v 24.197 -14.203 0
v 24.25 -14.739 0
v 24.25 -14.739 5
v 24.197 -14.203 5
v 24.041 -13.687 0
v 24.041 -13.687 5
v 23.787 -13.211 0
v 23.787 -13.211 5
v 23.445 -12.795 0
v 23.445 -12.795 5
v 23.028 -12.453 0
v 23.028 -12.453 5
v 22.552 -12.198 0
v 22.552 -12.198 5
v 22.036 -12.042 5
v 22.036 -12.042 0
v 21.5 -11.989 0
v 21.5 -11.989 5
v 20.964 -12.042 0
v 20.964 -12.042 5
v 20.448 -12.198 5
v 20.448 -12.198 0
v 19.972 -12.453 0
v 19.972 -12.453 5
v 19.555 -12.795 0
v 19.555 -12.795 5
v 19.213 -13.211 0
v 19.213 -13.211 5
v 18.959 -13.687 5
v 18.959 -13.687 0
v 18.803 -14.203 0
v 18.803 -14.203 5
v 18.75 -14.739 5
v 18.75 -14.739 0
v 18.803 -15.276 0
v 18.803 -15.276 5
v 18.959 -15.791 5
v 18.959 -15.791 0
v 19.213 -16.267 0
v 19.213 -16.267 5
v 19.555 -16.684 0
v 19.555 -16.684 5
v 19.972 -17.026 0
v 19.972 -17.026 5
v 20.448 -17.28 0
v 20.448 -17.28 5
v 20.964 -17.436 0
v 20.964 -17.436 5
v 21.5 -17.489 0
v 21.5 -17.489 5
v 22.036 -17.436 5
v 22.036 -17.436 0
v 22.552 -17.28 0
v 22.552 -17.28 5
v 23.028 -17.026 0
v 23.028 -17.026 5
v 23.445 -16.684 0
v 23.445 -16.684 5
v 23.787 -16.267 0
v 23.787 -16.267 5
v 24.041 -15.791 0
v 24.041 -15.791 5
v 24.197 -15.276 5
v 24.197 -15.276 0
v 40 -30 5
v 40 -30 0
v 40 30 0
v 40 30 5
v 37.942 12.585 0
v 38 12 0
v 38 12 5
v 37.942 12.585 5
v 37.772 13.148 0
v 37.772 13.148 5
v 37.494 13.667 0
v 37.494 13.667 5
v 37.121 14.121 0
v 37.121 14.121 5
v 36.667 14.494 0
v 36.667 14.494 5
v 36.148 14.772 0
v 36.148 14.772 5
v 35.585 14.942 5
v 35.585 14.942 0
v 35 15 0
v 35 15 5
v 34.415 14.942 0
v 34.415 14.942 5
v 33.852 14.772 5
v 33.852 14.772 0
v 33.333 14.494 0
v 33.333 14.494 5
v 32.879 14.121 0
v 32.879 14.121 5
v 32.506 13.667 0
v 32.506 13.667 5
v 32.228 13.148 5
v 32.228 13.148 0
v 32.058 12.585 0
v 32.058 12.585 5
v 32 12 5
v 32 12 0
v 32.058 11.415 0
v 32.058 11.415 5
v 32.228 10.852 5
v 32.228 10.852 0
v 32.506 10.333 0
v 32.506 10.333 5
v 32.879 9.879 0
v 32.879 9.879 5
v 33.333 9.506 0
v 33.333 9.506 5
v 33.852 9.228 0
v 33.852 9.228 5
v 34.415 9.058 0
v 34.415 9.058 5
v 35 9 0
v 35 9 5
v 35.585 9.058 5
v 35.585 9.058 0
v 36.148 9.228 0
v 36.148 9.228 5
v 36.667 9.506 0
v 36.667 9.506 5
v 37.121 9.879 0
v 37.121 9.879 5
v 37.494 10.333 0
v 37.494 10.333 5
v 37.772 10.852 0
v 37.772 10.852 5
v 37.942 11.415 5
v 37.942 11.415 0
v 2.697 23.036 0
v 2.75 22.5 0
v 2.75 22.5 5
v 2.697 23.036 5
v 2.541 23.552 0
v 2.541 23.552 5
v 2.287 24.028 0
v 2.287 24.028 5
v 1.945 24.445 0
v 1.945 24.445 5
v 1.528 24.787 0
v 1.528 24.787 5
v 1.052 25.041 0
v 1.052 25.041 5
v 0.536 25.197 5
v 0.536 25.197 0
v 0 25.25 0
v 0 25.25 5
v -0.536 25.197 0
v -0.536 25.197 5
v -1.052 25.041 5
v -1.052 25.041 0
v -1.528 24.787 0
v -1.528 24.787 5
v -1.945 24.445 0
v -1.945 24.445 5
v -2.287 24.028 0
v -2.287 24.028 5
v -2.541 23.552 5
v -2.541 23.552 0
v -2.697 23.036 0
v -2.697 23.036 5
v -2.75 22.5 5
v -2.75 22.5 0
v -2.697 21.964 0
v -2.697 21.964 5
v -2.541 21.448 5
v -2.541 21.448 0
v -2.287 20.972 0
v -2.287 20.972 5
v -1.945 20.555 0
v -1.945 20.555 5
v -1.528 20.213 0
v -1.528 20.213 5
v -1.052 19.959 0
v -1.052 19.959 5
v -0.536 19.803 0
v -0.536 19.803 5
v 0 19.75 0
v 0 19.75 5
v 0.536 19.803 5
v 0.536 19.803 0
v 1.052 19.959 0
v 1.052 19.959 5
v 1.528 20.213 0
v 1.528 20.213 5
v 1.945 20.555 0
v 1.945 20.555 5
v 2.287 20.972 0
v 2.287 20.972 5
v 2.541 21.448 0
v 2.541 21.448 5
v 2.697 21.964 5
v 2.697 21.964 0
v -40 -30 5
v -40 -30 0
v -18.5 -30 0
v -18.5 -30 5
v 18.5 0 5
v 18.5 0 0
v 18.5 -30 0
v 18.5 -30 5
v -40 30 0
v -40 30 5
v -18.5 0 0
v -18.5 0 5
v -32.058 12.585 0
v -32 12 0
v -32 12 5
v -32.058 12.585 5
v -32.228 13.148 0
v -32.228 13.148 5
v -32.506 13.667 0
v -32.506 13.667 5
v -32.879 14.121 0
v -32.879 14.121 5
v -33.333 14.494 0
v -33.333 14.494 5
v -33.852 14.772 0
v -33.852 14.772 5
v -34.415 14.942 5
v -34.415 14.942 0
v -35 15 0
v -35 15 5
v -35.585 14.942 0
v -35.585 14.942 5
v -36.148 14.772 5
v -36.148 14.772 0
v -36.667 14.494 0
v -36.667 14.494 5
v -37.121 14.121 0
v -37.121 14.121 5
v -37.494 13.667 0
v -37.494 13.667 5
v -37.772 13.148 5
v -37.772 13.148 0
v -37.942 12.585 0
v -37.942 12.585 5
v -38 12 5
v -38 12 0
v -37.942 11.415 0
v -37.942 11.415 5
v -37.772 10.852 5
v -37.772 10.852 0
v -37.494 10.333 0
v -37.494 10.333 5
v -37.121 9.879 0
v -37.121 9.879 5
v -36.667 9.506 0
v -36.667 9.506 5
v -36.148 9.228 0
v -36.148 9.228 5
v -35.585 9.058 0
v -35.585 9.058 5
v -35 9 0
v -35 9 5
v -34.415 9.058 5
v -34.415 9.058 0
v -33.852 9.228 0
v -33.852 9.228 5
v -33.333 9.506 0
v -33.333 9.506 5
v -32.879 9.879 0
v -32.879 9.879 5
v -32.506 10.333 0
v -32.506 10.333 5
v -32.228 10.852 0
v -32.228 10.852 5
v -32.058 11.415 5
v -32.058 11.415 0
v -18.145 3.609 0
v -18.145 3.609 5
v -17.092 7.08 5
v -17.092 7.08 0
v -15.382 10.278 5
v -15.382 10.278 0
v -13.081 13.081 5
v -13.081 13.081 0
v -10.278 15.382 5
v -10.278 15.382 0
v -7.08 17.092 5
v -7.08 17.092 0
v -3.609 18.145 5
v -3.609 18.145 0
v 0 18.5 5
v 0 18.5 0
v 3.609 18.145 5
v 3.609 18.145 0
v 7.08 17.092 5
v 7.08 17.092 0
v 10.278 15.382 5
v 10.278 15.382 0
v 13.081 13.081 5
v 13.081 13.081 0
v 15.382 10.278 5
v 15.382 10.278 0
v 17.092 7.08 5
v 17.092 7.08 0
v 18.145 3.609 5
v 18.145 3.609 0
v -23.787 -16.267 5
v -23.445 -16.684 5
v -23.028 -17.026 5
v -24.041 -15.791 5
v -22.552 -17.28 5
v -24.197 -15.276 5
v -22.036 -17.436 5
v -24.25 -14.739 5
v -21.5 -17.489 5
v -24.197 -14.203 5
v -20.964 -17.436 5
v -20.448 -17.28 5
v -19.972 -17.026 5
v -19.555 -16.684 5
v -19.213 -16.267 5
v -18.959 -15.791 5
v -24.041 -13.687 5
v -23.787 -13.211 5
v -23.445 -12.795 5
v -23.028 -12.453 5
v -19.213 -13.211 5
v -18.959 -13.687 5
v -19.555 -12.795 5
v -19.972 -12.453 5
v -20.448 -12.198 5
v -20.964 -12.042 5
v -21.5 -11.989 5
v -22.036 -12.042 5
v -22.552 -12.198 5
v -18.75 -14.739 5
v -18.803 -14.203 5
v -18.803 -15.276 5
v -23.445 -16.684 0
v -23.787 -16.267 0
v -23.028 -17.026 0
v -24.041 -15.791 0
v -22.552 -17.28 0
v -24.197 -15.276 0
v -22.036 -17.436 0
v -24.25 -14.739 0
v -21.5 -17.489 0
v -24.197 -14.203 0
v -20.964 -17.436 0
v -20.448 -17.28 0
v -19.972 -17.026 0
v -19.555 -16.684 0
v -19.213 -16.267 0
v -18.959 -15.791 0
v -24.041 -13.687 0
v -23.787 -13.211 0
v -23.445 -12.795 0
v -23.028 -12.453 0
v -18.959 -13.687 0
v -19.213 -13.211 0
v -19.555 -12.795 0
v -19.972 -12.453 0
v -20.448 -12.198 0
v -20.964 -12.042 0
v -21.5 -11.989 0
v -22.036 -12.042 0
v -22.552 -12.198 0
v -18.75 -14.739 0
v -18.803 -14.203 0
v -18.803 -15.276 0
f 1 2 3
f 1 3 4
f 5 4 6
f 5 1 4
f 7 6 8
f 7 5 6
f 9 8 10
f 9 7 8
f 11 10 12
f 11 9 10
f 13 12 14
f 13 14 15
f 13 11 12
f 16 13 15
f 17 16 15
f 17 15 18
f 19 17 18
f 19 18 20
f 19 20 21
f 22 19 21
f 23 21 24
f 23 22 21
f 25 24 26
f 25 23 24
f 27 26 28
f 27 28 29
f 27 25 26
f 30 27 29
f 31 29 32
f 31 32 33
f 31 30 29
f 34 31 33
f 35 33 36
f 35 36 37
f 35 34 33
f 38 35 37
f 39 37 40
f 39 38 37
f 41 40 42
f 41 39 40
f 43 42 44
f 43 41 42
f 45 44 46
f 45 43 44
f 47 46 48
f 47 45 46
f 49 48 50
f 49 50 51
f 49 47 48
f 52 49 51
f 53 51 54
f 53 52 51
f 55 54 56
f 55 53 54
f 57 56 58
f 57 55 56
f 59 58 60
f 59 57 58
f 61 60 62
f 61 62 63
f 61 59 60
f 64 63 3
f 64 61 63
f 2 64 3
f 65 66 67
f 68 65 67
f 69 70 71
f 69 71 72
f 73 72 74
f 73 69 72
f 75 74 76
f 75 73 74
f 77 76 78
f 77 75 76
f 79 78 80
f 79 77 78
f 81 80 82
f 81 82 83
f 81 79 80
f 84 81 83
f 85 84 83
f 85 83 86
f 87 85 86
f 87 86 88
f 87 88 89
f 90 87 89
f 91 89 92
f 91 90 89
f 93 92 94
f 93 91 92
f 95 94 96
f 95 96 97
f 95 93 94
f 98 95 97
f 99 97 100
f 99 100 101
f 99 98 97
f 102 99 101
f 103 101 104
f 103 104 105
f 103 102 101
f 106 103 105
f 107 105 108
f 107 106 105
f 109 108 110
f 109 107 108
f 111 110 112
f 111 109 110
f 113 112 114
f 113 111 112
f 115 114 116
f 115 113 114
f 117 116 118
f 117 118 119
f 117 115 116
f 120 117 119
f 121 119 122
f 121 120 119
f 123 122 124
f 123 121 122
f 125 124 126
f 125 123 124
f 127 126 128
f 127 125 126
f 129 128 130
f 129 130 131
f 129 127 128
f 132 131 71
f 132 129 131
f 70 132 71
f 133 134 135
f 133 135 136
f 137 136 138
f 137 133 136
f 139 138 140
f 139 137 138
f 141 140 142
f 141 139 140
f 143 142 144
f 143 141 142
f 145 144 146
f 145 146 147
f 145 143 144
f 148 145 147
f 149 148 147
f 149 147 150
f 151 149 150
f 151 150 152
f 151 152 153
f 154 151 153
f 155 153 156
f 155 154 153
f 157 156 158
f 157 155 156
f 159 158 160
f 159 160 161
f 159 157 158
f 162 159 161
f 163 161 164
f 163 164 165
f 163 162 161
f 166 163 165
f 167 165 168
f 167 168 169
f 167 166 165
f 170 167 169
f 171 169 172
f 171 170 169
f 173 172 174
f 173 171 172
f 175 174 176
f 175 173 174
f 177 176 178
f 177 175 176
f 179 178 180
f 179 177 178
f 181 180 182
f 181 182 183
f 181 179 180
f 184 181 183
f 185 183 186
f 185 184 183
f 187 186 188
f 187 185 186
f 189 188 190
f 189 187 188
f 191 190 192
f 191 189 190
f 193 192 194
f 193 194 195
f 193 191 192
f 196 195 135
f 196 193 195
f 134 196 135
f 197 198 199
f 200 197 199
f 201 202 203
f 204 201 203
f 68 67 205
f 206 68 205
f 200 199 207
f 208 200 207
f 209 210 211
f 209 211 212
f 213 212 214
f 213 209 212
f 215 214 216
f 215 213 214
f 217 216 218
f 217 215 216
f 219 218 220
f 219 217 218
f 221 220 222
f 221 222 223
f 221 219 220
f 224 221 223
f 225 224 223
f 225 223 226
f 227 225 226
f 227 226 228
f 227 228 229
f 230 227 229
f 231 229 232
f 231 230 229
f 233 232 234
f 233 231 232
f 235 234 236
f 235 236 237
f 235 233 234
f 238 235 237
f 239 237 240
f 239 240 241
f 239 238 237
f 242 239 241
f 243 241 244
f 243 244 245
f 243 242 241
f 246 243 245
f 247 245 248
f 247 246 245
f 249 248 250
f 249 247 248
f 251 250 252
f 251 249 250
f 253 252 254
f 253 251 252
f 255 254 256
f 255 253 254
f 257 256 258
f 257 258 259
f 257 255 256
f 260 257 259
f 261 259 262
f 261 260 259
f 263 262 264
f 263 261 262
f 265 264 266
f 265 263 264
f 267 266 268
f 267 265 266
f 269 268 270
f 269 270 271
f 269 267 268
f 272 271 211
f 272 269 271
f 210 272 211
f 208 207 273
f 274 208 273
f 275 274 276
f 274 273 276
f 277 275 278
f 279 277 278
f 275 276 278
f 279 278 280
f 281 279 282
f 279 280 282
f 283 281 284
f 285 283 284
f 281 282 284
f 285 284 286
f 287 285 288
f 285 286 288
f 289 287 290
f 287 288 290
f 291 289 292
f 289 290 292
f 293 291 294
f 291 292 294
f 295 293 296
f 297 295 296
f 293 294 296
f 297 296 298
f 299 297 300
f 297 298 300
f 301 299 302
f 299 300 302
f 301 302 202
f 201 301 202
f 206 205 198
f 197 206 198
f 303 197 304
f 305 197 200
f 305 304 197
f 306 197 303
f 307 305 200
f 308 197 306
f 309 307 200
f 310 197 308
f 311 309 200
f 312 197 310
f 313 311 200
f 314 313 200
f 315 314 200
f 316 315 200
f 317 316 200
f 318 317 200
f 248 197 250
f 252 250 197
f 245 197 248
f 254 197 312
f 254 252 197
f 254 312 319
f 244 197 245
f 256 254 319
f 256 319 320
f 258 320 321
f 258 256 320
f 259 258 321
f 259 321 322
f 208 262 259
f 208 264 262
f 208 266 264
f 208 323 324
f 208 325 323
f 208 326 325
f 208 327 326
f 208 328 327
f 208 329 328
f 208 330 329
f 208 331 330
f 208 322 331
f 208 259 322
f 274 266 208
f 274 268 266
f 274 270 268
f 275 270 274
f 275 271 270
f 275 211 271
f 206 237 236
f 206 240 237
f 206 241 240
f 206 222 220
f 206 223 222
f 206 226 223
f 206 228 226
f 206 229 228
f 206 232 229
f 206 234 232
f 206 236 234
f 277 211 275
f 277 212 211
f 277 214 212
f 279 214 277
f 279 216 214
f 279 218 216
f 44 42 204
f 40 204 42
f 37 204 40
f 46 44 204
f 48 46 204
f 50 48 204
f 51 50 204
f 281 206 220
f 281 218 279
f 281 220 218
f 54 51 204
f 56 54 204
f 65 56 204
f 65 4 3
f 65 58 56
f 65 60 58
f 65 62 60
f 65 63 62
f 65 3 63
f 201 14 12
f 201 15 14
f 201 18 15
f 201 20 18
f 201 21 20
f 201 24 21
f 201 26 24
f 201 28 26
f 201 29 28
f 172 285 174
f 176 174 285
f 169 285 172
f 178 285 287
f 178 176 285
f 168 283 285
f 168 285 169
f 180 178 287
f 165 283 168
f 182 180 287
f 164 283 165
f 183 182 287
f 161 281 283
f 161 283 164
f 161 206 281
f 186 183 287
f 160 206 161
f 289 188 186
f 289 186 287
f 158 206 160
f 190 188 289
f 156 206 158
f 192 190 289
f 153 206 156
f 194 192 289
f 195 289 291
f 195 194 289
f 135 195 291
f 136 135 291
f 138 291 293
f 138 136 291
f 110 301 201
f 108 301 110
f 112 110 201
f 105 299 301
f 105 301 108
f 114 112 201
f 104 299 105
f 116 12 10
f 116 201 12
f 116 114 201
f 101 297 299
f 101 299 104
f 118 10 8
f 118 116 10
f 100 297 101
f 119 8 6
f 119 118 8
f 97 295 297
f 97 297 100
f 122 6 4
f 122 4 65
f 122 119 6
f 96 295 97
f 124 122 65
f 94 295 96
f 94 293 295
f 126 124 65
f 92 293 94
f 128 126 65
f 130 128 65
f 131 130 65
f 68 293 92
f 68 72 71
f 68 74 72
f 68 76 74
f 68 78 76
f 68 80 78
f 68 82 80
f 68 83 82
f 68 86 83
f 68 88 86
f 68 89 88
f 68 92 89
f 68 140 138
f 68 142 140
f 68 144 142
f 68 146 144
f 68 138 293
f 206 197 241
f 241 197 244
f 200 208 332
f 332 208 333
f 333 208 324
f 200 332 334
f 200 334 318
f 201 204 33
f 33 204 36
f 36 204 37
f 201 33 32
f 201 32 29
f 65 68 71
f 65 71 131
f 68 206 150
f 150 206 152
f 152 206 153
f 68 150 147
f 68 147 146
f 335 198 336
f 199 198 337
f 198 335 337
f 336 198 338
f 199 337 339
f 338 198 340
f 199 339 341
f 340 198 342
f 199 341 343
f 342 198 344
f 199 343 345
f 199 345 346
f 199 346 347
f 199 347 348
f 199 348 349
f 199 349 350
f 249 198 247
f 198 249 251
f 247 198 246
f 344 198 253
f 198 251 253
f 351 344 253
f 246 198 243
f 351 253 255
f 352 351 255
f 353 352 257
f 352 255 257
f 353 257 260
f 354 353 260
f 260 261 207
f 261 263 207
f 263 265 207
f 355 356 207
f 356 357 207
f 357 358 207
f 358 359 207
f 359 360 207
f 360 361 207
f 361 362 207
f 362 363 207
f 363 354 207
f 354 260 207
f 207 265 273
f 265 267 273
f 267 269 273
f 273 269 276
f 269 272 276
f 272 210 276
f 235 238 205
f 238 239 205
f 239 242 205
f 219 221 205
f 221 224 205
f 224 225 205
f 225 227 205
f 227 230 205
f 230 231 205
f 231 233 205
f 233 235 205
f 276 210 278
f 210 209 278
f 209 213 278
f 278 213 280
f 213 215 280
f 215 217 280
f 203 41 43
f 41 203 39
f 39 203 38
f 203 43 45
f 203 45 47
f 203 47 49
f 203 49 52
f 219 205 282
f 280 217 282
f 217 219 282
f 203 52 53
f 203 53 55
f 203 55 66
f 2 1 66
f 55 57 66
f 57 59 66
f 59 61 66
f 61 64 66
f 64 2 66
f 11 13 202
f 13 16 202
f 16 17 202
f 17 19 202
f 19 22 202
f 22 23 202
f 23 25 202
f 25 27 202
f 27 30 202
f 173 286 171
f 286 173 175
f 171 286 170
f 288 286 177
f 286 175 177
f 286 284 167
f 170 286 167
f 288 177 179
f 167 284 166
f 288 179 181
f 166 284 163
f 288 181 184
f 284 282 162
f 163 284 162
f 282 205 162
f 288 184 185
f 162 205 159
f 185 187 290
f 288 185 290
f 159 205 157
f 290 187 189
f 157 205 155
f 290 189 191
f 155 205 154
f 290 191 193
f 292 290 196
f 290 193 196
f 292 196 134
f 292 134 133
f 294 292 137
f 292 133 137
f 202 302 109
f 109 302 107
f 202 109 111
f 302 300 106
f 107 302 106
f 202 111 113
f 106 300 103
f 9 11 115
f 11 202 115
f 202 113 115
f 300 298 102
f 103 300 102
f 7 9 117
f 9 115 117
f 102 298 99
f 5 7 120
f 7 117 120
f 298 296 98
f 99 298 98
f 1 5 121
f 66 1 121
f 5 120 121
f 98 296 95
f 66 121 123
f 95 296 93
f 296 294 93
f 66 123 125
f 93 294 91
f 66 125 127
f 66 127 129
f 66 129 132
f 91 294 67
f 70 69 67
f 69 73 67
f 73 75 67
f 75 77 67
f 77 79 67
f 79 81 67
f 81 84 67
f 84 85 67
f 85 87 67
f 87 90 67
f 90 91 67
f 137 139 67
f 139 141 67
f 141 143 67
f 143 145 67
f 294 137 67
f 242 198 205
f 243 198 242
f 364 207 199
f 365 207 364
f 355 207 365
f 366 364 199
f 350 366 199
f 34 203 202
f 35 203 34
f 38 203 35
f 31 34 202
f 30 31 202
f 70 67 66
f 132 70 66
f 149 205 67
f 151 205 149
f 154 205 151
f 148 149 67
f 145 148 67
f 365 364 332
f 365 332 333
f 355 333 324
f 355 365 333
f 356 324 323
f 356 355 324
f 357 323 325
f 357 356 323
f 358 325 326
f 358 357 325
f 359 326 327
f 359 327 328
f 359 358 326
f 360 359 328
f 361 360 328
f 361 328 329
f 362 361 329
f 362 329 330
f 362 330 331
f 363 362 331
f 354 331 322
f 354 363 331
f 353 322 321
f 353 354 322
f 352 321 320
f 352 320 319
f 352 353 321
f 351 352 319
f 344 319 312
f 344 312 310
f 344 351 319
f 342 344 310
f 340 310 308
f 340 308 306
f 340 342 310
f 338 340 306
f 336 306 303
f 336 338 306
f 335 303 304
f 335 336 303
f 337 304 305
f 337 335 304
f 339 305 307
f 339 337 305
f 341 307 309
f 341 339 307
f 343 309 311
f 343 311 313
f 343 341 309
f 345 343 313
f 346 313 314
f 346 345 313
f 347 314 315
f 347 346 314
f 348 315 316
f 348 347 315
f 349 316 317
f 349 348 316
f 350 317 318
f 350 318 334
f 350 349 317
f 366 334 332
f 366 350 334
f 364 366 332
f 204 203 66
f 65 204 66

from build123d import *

# Parameters (mm, degrees)
F0_R     = 2.75
F0_R_2   = 3
F1_DEPTH = 5


with BuildPart() as f1:
    # F0 (on Top) → F1 (new body)
    with BuildSketch(Plane.XY):
        with BuildLine():
            Line((-40, 30), (-40, -30))
            Line((-40, -30), (-18.5, -30))
            Line((-18.5, -30), (-18.5, 0))
            ThreePointArc((-18.5, 0), (0, 18.5), (18.5, 0))
            Line((18.5, 0), (18.5, -30))
            Line((18.5, -30), (40, -30))
            Line((40, -30), (40, 30))
            Line((40, 30), (-40, 30))
        make_face()
        with Locations((-21.5, -14.739092)):
            Circle(F0_R, mode=Mode.SUBTRACT)
        with Locations((21.5, -14.739092)):
            Circle(F0_R, mode=Mode.SUBTRACT)
        with Locations((-35, 12)):
            Circle(F0_R_2, mode=Mode.SUBTRACT)
        with Locations((35, 12)):
            Circle(F0_R_2, mode=Mode.SUBTRACT)
        with Locations((0, 22.5)):
            Circle(F0_R, mode=Mode.SUBTRACT)
    extrude(amount=F1_DEPTH)


solid = f1.part
